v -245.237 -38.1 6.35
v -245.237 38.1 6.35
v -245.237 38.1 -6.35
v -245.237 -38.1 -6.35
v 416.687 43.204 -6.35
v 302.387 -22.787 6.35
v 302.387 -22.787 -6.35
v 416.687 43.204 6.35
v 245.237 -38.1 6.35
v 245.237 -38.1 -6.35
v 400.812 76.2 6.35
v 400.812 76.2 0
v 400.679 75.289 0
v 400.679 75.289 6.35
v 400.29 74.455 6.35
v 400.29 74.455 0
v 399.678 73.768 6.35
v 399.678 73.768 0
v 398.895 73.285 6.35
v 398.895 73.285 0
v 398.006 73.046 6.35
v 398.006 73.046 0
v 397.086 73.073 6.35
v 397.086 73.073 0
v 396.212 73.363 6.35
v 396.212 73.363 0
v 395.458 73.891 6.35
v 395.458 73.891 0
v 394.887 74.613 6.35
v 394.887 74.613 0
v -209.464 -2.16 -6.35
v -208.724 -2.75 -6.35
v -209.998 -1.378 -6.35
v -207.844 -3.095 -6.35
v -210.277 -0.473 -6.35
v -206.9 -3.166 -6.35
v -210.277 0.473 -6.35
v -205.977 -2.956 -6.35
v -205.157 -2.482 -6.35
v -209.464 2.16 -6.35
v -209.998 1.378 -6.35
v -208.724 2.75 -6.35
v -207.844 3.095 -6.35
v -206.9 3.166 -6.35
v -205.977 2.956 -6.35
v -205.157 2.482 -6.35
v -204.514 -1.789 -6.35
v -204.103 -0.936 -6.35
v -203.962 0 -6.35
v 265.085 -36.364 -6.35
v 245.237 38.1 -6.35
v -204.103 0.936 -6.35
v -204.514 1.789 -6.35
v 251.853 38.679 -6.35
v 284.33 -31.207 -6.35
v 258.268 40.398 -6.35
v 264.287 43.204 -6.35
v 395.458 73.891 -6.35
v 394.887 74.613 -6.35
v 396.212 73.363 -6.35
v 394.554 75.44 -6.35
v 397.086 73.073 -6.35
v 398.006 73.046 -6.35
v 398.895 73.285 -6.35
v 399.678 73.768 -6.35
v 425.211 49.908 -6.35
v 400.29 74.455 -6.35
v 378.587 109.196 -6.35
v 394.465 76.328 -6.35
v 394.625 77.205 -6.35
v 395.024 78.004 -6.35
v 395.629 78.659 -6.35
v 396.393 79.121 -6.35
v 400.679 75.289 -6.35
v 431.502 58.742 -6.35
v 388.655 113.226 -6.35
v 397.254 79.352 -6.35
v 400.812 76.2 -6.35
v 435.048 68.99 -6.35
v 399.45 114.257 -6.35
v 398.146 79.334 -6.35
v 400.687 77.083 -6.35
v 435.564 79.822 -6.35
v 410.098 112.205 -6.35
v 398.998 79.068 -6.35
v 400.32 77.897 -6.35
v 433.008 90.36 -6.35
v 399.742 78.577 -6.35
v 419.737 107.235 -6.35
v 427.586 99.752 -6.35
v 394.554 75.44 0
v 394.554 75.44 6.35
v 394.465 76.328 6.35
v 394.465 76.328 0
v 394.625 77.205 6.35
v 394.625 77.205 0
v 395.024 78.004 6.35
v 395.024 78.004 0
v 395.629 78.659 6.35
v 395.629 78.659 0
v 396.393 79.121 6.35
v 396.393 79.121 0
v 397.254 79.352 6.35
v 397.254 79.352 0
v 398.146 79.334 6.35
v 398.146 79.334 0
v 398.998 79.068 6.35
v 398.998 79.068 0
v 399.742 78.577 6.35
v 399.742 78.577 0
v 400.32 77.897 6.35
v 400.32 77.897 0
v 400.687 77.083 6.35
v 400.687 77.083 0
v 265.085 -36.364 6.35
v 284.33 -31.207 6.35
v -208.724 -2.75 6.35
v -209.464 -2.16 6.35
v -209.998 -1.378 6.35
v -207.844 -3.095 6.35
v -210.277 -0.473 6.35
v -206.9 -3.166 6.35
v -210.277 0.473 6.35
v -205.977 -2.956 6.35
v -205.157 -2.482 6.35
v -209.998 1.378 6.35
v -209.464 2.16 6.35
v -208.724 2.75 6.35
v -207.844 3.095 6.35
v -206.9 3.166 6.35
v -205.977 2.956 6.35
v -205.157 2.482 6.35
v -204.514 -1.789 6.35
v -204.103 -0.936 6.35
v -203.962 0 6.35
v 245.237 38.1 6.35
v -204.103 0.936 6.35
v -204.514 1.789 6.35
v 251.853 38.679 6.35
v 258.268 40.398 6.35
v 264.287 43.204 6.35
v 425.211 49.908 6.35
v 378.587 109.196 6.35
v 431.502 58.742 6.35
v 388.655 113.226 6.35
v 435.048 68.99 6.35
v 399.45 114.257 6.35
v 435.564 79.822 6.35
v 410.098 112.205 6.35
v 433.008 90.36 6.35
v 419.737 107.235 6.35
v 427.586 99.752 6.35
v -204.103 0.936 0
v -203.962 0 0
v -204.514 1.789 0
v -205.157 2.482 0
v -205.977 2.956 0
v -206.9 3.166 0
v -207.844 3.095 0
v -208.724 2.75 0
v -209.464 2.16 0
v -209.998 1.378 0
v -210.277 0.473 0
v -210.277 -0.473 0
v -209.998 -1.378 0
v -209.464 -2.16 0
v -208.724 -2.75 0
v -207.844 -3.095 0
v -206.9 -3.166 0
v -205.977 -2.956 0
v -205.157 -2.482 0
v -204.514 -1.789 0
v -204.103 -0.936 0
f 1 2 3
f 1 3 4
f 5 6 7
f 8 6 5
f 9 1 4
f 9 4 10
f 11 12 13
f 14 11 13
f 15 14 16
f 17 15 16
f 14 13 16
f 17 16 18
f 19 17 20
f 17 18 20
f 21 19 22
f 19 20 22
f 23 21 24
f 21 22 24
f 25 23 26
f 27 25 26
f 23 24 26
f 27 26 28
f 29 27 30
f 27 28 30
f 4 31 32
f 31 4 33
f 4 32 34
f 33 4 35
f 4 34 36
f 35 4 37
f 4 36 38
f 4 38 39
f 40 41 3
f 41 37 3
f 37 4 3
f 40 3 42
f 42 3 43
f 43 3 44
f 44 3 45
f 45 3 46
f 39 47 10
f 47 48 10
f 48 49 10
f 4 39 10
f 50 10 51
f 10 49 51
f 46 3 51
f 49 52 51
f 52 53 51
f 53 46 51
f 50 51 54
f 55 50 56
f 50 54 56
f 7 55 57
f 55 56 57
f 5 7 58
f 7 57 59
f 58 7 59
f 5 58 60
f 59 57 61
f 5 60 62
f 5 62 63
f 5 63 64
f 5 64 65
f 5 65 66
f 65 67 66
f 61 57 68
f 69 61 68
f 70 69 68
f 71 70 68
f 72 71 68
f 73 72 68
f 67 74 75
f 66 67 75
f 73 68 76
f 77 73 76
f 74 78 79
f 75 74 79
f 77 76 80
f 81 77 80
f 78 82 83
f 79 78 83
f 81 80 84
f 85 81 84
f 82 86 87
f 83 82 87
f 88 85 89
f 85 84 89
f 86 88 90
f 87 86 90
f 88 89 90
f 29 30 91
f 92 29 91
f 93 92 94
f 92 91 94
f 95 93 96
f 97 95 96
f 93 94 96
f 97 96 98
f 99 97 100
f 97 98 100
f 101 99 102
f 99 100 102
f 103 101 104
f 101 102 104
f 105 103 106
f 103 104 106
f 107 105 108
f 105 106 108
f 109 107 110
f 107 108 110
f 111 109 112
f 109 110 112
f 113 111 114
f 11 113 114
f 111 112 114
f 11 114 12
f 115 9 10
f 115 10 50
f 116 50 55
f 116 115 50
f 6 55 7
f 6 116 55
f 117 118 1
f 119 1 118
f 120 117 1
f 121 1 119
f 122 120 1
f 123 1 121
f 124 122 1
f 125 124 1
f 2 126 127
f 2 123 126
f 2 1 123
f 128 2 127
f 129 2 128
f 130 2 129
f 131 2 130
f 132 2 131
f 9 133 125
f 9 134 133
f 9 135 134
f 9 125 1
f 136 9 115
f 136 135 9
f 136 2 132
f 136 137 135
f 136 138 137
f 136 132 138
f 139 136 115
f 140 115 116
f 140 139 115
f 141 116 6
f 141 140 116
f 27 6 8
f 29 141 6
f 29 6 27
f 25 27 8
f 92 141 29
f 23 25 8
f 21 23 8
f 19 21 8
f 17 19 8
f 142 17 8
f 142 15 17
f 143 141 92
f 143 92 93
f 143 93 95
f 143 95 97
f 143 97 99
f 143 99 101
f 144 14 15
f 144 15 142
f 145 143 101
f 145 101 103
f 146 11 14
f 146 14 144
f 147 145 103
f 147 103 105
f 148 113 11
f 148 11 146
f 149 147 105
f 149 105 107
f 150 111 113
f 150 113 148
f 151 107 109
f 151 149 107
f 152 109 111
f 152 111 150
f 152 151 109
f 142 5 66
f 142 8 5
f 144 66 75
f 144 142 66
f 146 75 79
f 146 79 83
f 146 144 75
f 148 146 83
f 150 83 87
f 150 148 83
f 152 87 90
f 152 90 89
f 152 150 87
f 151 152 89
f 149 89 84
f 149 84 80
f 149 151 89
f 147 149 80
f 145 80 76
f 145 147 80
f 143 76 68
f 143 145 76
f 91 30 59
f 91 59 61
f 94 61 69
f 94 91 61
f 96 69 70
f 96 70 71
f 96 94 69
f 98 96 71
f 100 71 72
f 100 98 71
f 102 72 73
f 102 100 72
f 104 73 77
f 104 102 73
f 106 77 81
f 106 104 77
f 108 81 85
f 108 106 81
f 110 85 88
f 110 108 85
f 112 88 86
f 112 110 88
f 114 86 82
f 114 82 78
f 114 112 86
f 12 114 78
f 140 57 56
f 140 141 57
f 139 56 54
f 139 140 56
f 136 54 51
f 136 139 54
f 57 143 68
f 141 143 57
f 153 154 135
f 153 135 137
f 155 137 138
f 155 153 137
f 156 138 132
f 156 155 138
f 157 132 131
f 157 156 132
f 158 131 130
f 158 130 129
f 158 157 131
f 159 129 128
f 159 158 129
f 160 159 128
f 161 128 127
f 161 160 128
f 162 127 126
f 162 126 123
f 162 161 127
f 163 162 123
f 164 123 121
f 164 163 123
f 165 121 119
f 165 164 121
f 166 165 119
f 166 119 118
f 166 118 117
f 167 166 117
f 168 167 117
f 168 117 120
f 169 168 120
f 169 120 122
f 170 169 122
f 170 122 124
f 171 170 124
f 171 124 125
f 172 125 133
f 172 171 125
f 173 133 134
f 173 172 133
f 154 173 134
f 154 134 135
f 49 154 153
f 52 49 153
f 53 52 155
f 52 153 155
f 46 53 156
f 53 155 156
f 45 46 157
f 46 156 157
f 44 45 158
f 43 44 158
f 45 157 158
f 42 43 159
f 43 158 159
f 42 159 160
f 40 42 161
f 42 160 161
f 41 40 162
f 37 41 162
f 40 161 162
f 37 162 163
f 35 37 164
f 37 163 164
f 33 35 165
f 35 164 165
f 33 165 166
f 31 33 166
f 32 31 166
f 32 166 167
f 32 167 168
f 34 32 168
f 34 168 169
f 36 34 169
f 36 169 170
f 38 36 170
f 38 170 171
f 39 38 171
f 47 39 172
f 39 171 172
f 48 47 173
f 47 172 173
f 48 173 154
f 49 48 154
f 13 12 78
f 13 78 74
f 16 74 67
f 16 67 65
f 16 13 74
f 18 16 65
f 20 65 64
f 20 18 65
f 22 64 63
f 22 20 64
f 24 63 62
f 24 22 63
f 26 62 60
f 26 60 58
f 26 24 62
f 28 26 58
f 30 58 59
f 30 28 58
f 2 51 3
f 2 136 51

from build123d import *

# Parameters (mm, degrees)
F0_R     = 3.175
F1_DEPTH = 6.35


# Not quite as in the source:
# - a feature names something its author has since deleted; it is built from what else it names


with BuildPart() as f1:
    # F0 (on Top) → F1 (new body, symmetric)
    with BuildSketch(Plane.XY):
        with BuildLine():
            Line((245.237, 38.1), (-245.237, 38.1))
            Line((-245.237, 38.1), (-245.237, -38.1))
            Line((-245.237, -38.1), (245.237, -38.1))
            ThreePointArc((245.237, -38.1), (274.8200168552, -34.2053219448), (302.387, -22.7867036526))
            Line((302.387, -22.7867036526), (416.687, 43.2044321158))
            ThreePointArc((416.687, 43.2044321158), (430.6325678842, 95.25), (378.587, 109.1955678842))
            Line((378.587, 109.1955678842), (321.437, 76.2))
            Line((321.437, 76.2), (264.287, 43.2044321158))
            ThreePointArc((264.287, 43.2044321158), (255.0980056184, 39.3982260184), (245.237, 38.1))
        make_face()
        with Locations((-207.137, 0)):
            Circle(F0_R, mode=Mode.SUBTRACT)
        with BuildLine():
            ThreePointArc((394.887369343, 74.6125), (396.8152495318, 79.2668144985), (400.812, 76.2))
            ThreePointArc((400.812, 76.2), (398.4587504682, 73.1331855015), (394.887369343, 74.6125))
        make_face(mode=Mode.SUBTRACT)
    extrude(amount=F1_DEPTH, both=True)


solid = f1.part
